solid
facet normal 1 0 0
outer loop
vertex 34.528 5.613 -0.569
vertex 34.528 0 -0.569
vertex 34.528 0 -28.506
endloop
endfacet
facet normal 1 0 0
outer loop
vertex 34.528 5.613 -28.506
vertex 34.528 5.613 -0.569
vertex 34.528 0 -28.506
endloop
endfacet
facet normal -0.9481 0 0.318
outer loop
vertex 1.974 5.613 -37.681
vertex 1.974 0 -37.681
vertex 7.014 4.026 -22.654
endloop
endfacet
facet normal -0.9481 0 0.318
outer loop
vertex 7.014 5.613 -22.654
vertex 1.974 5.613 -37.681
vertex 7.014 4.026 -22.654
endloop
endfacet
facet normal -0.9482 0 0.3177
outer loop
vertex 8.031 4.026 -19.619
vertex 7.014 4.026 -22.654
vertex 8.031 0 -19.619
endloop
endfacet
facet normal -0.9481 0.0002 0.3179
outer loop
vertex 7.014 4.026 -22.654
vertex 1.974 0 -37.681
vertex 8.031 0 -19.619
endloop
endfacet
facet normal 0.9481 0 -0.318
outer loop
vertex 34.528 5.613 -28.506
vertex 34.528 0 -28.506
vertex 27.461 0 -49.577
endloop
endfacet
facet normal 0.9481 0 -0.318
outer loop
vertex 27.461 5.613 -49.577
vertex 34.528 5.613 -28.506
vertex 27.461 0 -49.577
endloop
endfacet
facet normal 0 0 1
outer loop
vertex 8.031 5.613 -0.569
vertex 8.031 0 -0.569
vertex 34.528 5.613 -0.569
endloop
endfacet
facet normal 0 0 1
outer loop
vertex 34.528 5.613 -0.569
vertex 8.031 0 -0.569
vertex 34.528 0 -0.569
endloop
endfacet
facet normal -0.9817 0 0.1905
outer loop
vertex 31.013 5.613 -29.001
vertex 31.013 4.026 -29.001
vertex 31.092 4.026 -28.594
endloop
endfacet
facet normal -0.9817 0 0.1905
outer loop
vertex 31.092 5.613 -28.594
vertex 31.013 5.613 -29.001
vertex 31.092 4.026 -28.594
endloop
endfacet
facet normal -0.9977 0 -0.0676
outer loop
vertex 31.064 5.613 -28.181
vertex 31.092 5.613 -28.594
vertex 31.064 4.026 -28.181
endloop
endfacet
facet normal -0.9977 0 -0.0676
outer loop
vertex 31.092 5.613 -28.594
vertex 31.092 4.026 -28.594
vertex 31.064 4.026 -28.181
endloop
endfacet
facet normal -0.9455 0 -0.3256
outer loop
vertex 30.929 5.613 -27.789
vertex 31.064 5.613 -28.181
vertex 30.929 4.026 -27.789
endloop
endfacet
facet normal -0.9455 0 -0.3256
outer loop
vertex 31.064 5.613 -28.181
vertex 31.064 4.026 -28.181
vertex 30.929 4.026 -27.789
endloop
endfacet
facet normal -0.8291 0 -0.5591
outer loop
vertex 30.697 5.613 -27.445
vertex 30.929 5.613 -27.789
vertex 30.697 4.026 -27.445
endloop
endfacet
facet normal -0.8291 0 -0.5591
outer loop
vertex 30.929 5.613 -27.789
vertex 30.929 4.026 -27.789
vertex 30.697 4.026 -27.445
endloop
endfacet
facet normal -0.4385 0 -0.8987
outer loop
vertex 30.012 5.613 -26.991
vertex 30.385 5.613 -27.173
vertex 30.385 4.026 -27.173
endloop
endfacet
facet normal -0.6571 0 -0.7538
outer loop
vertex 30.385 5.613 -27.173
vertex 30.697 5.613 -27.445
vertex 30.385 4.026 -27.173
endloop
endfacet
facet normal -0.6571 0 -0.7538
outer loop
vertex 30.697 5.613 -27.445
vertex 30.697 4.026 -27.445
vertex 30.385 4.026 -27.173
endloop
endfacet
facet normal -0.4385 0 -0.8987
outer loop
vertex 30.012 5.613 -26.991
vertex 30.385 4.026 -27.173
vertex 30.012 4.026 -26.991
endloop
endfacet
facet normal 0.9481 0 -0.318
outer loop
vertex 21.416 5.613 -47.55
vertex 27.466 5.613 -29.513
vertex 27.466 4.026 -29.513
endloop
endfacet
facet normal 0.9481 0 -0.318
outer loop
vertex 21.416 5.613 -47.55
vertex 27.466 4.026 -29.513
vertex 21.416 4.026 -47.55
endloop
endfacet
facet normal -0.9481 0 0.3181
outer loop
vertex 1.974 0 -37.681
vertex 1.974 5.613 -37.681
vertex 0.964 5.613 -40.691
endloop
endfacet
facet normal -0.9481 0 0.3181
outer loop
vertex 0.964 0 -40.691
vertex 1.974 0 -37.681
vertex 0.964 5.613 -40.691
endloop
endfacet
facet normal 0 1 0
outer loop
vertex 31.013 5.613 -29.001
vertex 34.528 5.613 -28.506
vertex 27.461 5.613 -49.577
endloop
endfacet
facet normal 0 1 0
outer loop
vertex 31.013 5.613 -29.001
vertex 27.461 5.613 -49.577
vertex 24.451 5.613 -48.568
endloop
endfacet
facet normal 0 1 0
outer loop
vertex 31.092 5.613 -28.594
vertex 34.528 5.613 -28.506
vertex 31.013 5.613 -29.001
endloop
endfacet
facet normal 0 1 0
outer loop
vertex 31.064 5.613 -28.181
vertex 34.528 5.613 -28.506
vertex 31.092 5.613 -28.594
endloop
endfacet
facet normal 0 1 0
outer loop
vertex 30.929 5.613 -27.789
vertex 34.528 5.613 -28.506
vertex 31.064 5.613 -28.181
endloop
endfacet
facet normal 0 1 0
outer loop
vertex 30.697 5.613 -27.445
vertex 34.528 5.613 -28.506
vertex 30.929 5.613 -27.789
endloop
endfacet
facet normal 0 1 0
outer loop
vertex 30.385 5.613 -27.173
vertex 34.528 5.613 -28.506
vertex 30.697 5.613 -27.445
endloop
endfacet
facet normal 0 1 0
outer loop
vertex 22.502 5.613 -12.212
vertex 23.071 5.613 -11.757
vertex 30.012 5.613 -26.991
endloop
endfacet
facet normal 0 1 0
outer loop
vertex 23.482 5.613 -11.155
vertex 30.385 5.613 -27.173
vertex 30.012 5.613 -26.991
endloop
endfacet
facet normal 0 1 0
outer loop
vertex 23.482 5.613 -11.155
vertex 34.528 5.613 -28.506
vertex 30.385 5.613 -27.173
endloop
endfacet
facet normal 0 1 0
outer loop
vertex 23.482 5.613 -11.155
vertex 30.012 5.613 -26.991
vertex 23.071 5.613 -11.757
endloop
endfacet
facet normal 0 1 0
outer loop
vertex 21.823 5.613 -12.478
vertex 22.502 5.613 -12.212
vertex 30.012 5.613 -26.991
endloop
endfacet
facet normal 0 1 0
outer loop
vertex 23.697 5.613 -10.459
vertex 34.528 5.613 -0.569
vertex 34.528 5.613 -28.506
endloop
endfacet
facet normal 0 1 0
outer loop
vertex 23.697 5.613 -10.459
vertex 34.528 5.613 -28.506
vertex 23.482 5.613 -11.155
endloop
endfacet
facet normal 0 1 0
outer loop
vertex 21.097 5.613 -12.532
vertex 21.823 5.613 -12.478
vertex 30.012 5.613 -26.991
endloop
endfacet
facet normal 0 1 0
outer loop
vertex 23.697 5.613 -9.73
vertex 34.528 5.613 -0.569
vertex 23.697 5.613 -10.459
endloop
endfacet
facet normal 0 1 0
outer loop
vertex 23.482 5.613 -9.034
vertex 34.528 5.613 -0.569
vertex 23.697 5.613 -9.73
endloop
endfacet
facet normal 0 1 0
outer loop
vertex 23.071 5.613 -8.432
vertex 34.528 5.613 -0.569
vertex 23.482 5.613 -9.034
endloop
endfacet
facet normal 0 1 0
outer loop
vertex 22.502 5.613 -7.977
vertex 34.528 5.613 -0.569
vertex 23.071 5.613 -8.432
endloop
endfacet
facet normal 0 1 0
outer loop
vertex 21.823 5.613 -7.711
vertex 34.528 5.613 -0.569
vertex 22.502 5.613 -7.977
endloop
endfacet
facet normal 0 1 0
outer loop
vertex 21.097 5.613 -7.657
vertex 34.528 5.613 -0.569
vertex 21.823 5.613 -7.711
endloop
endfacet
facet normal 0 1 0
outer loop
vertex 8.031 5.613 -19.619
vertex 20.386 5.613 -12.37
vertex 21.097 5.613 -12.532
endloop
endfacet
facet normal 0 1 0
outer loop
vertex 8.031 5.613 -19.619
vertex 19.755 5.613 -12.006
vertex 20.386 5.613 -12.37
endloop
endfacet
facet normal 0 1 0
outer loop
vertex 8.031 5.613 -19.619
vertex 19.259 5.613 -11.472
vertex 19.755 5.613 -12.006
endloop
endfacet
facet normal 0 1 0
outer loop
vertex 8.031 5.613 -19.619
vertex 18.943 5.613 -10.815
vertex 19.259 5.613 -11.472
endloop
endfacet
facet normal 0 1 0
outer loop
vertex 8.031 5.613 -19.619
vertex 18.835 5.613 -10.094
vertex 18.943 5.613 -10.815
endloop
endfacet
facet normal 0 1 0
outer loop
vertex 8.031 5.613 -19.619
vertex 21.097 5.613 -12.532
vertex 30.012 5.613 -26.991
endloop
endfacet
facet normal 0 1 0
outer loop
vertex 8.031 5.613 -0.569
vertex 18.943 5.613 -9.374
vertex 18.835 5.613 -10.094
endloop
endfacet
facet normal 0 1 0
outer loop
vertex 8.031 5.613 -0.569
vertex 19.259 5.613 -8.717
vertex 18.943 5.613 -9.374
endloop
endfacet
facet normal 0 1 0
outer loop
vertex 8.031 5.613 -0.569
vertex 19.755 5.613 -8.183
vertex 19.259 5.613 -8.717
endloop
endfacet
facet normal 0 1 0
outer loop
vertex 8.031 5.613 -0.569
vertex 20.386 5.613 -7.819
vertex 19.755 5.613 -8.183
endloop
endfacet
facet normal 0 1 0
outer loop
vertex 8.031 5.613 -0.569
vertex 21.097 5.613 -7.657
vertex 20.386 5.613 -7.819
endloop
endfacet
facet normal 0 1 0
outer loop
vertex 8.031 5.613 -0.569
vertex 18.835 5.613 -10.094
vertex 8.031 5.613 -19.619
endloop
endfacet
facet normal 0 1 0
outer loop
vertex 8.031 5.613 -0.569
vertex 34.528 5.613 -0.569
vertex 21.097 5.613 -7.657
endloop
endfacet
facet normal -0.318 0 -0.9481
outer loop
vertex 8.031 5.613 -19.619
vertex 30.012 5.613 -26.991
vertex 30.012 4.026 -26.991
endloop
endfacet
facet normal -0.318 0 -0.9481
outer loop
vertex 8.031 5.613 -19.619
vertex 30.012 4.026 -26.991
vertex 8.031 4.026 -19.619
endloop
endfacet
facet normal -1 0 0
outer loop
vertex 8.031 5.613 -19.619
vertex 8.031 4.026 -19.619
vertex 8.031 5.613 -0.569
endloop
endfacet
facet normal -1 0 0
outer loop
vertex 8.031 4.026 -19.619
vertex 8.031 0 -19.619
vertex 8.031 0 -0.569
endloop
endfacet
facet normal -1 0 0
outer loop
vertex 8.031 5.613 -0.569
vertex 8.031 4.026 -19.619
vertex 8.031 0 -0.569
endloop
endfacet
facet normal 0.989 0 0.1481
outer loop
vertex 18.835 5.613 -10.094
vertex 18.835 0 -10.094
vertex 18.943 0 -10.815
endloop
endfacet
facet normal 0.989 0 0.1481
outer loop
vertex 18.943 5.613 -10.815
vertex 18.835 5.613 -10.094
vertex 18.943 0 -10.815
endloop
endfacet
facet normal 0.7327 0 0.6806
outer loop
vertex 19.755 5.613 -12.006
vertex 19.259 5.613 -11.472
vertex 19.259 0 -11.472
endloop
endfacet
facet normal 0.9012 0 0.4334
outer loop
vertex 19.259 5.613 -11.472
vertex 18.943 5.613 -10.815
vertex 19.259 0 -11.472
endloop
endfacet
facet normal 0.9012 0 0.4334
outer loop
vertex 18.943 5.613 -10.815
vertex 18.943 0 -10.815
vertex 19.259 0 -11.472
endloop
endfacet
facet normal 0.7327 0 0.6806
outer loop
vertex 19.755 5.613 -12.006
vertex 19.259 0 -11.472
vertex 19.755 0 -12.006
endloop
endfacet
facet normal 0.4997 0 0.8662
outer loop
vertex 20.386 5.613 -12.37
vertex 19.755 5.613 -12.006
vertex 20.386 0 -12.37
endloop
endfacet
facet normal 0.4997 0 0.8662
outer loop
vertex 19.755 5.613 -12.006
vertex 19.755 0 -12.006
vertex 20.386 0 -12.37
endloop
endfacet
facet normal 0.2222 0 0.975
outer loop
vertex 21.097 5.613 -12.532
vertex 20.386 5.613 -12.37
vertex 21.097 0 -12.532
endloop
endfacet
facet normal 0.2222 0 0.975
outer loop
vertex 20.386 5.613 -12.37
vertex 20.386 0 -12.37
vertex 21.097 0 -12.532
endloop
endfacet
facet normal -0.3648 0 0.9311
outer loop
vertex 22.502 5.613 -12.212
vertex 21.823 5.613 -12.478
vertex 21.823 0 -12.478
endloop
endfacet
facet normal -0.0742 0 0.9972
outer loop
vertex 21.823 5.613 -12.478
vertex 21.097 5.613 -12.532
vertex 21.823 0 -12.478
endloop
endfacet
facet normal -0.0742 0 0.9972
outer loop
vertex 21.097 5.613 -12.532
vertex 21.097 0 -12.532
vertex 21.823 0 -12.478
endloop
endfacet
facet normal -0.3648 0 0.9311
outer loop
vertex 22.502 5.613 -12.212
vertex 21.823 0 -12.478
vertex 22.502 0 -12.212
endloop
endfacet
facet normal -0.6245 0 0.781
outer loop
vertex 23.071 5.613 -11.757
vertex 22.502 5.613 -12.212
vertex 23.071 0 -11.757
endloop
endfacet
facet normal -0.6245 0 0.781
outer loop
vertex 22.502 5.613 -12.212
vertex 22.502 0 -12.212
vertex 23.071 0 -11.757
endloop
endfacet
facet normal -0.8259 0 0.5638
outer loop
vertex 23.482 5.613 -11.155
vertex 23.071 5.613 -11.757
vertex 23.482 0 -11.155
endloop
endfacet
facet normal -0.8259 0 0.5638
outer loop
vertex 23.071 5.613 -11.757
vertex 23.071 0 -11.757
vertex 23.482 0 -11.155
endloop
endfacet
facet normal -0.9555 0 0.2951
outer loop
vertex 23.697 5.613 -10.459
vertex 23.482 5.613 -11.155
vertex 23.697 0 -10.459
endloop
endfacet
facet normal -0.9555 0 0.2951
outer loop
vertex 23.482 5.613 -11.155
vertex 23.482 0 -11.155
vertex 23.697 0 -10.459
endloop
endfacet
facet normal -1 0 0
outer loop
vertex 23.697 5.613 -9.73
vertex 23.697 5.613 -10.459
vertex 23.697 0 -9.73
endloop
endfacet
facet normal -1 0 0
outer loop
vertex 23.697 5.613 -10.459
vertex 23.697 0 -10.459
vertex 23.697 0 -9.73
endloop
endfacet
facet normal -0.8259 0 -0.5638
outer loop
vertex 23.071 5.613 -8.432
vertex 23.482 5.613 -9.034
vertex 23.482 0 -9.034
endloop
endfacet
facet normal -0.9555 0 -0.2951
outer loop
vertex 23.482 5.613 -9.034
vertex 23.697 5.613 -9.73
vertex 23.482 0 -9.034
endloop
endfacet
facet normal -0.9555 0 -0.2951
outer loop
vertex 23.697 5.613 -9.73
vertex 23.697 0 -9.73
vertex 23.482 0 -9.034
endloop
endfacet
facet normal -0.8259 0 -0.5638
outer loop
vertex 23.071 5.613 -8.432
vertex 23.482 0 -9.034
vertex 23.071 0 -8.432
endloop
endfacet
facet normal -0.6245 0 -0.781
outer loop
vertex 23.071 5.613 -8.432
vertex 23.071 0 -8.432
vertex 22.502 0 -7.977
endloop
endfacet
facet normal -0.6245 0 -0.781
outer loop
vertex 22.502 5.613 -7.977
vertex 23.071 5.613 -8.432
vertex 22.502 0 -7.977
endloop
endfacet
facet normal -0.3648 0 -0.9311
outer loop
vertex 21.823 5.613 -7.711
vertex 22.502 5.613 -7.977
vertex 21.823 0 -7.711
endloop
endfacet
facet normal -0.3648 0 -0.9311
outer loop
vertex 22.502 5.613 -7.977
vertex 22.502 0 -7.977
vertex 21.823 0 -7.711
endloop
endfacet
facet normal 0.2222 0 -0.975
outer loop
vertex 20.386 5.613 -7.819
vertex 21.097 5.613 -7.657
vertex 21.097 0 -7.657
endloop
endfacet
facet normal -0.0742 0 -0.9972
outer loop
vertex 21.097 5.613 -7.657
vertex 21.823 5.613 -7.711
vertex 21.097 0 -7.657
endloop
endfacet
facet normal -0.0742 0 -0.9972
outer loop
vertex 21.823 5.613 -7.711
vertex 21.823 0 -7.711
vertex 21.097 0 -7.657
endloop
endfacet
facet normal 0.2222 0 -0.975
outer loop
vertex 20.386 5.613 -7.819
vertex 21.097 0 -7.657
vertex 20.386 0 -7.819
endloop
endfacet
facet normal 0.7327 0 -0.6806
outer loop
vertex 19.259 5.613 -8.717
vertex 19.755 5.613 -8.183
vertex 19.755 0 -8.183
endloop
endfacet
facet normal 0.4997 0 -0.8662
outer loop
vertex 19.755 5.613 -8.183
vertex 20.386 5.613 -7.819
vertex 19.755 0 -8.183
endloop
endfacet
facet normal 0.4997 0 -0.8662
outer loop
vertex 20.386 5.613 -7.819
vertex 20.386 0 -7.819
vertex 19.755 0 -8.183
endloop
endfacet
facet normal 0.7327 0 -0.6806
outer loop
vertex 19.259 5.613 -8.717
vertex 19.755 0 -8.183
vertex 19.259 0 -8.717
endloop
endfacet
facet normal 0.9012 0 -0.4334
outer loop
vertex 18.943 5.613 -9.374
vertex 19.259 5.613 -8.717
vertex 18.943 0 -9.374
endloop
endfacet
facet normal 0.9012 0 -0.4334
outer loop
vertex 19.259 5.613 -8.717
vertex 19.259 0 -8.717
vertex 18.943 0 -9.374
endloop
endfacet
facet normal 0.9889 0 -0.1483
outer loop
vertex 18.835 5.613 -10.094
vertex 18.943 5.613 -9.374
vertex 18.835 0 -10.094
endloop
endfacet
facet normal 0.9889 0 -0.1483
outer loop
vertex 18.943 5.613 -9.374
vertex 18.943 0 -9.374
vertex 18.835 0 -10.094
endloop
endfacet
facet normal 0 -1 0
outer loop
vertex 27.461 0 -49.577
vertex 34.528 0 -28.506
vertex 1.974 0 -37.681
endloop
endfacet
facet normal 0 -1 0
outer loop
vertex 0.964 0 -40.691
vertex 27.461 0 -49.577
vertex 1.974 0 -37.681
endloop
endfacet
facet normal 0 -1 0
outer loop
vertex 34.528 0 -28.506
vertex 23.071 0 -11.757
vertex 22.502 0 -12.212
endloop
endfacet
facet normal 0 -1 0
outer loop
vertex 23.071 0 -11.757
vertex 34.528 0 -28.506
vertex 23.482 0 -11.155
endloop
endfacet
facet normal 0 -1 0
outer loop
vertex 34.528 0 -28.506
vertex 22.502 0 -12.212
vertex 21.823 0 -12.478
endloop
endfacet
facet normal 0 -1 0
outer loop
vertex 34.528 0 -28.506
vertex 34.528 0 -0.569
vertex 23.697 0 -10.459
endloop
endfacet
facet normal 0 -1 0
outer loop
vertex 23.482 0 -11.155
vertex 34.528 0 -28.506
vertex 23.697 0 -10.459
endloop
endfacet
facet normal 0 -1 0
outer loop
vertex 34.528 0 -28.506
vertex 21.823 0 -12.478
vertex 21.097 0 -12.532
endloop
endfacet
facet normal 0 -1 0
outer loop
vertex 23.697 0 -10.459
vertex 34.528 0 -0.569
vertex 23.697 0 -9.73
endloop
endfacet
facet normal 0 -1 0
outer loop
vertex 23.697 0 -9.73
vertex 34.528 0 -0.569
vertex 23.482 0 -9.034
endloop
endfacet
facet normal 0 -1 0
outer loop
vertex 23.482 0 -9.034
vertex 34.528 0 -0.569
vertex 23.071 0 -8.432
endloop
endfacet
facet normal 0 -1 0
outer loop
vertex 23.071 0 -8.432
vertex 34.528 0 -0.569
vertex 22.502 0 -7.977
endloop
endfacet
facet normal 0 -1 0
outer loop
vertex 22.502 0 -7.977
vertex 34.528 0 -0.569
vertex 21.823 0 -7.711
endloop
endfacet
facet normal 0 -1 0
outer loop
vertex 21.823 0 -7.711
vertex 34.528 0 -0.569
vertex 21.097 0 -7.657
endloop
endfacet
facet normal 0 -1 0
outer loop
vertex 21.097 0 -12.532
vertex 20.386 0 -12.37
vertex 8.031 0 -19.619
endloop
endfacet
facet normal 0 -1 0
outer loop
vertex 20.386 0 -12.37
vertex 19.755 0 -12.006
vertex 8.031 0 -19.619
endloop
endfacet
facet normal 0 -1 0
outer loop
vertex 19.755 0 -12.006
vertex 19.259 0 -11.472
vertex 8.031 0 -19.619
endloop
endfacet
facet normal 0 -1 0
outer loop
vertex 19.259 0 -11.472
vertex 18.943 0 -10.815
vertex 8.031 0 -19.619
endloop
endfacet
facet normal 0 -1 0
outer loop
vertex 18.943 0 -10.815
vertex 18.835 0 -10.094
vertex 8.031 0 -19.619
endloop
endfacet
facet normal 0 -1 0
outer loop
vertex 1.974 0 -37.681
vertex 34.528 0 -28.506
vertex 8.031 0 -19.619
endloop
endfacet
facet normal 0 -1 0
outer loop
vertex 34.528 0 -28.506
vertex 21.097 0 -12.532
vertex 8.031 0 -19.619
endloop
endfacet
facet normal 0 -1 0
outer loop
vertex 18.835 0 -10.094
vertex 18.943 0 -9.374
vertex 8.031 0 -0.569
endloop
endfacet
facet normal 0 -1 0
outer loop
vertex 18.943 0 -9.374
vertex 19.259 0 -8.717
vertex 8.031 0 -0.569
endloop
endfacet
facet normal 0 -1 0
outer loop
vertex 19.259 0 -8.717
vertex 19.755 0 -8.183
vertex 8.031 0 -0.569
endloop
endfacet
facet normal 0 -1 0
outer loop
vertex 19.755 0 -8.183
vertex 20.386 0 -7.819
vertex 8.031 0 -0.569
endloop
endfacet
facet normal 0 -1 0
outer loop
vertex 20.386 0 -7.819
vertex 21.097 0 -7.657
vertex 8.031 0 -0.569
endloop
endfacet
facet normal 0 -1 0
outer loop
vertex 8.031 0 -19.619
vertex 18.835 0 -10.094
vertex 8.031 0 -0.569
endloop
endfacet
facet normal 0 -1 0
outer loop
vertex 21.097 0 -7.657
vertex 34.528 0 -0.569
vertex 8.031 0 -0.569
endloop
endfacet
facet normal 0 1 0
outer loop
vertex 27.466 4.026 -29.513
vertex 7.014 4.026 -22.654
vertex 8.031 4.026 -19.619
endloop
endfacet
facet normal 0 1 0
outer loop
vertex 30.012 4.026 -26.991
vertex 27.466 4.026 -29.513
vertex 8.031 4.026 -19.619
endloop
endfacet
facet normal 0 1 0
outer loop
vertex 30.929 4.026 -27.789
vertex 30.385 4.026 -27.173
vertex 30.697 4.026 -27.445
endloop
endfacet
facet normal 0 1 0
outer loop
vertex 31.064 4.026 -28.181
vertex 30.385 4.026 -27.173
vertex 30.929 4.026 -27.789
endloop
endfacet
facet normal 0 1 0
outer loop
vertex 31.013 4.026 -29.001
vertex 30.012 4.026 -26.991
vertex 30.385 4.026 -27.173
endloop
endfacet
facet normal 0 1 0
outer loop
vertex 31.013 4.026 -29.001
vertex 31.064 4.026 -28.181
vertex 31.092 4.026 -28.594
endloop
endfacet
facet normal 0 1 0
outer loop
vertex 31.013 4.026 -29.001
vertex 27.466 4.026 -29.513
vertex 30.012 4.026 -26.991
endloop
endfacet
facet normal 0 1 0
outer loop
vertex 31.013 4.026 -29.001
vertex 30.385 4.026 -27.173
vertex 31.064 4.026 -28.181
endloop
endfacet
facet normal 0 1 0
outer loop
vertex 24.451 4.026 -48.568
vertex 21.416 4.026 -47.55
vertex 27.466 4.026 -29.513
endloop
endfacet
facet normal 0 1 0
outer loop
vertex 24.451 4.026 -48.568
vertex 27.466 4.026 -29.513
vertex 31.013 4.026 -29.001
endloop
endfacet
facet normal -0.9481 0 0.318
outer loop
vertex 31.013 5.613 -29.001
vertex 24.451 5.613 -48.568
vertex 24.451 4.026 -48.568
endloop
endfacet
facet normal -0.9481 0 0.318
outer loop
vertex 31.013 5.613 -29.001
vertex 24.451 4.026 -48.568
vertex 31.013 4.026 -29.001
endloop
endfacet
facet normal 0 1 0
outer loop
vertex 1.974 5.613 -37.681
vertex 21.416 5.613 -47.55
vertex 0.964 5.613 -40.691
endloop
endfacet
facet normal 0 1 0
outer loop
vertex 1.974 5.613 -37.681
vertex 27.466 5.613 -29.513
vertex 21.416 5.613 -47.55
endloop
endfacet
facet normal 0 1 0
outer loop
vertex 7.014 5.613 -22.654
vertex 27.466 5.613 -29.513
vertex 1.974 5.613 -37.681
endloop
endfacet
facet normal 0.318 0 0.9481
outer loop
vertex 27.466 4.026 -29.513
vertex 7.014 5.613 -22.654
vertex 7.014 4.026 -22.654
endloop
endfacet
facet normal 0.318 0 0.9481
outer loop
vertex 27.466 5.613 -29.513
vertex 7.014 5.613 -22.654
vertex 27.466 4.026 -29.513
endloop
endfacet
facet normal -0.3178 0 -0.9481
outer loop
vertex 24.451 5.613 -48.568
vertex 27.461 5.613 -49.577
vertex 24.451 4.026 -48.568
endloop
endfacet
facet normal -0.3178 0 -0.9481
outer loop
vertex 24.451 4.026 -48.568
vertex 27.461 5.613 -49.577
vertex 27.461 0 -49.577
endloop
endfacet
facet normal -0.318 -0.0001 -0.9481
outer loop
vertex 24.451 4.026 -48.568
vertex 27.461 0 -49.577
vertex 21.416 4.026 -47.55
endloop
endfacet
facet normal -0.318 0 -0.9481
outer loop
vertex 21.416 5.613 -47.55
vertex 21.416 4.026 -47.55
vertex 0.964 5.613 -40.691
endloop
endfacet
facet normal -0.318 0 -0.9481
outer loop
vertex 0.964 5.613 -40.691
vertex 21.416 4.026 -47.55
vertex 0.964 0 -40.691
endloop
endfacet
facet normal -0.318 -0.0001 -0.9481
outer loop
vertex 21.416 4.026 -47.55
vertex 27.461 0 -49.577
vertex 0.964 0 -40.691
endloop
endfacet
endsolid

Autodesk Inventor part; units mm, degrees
ref_plane "YZ Plane" through (0, 0, 0) normal (1, 0, 0) x (0, 1, 0)
ref_plane "XZ Plane" through (0, 0, 0) normal (0, 1, 0) x (-1, 0, 0)
ref_plane "XY Plane" through (0, 0, 0) normal (0, 0, 1) x (1, 0, 0)
sketch "Sketch1" plane through (0, 0, 0) normal (0, 1, 0) x (-1, 0, 0)
  line L0 (-8.0312, -19.6194) -> (-8.0312, -0.5694)
  line L1 (-8.0312, -0.5694) -> (-34.5277, -0.5694)
  line L2 (-34.5277, -0.5694) -> (-34.5277, -28.5056)
  line L3 (18.6455, 5.0782) -> (18.6456, 5.0782)
  line L4 (-1.974, -37.6808) -> (-8.0312, -19.6194)
  line L5 (-34.5277, -28.5056) -> (-27.4611, -49.5771)
  line L6 (-1.974, -37.6808) -> (-0.9645, -40.691)
  line L7 (-27.4611, -49.5771) -> (-0.9645, -40.691)
  circle A0 centre (-21.2794, -10.0945) radius 2.4447
  line L8 (-8.0312, -0.5694) -> (-8.0312, -19.6194)
  line L9 (-8.0312, -19.6194) -> (-0.9645, -40.691)
  line L10 (-0.9645, -40.691) -> (-27.4611, -49.5771)
  line L11 (-27.4611, -49.5771) -> (-34.5277, -28.5056)
  line L12 (-34.5277, -28.5056) -> (-34.5277, -0.5694)
  line L13 (-34.5277, -0.5694) -> (-8.0312, -0.5694)
  point P0 (0, 0)
  dimension "d0" = 19.05
  dimension "d1" = 22.225
  dimension "d2" = 27.9469
  dimension "d3" = 26.4965
  dimension "d4" = 4.8895
extrude "Extrusion1" add sketch "Sketch1" along normal blind 5.6134
sketch "Sketch2" plane through (0, 5.6134, 0) normal (0, 1, 0) x (1, 0, 0)
  line L0 (31.5176, 27.4961) -> (8.0312, 19.6194)
  line L1 (8.0312, 19.6194) -> (7.0136, 22.6537)
  line L2 (7.0136, 22.6537) -> (27.4657, 29.5128)
  line L3 (31.5176, 27.4961) -> (29.9884, 26.9832)
  line L4 (27.4657, 29.5128) -> (21.4165, 47.5499)
  line L5 (21.4165, 47.5499) -> (24.4508, 48.5676)
  line L6 (24.4508, 48.5676) -> (31.5176, 27.4961)
  line L7 (27.4611, 49.5771) -> (0.9645, 40.691) projected
  point P0 (0, 0)
  point P1 (0, 0)
  dimension "d10" = 3.175
  dimension "d11" = 3.2004
  dimension "d12" = 3.2004
  dimension "d15" = 0
extrude "Extrusion2" cut sketch "Sketch2" against normal blind 1.5875
fillet "Fillet1" radius 1.5875 1 edges at (31.5176, 4.8197, -27.4961)
properties part number "Lidar Sensor Case Piece 2"
